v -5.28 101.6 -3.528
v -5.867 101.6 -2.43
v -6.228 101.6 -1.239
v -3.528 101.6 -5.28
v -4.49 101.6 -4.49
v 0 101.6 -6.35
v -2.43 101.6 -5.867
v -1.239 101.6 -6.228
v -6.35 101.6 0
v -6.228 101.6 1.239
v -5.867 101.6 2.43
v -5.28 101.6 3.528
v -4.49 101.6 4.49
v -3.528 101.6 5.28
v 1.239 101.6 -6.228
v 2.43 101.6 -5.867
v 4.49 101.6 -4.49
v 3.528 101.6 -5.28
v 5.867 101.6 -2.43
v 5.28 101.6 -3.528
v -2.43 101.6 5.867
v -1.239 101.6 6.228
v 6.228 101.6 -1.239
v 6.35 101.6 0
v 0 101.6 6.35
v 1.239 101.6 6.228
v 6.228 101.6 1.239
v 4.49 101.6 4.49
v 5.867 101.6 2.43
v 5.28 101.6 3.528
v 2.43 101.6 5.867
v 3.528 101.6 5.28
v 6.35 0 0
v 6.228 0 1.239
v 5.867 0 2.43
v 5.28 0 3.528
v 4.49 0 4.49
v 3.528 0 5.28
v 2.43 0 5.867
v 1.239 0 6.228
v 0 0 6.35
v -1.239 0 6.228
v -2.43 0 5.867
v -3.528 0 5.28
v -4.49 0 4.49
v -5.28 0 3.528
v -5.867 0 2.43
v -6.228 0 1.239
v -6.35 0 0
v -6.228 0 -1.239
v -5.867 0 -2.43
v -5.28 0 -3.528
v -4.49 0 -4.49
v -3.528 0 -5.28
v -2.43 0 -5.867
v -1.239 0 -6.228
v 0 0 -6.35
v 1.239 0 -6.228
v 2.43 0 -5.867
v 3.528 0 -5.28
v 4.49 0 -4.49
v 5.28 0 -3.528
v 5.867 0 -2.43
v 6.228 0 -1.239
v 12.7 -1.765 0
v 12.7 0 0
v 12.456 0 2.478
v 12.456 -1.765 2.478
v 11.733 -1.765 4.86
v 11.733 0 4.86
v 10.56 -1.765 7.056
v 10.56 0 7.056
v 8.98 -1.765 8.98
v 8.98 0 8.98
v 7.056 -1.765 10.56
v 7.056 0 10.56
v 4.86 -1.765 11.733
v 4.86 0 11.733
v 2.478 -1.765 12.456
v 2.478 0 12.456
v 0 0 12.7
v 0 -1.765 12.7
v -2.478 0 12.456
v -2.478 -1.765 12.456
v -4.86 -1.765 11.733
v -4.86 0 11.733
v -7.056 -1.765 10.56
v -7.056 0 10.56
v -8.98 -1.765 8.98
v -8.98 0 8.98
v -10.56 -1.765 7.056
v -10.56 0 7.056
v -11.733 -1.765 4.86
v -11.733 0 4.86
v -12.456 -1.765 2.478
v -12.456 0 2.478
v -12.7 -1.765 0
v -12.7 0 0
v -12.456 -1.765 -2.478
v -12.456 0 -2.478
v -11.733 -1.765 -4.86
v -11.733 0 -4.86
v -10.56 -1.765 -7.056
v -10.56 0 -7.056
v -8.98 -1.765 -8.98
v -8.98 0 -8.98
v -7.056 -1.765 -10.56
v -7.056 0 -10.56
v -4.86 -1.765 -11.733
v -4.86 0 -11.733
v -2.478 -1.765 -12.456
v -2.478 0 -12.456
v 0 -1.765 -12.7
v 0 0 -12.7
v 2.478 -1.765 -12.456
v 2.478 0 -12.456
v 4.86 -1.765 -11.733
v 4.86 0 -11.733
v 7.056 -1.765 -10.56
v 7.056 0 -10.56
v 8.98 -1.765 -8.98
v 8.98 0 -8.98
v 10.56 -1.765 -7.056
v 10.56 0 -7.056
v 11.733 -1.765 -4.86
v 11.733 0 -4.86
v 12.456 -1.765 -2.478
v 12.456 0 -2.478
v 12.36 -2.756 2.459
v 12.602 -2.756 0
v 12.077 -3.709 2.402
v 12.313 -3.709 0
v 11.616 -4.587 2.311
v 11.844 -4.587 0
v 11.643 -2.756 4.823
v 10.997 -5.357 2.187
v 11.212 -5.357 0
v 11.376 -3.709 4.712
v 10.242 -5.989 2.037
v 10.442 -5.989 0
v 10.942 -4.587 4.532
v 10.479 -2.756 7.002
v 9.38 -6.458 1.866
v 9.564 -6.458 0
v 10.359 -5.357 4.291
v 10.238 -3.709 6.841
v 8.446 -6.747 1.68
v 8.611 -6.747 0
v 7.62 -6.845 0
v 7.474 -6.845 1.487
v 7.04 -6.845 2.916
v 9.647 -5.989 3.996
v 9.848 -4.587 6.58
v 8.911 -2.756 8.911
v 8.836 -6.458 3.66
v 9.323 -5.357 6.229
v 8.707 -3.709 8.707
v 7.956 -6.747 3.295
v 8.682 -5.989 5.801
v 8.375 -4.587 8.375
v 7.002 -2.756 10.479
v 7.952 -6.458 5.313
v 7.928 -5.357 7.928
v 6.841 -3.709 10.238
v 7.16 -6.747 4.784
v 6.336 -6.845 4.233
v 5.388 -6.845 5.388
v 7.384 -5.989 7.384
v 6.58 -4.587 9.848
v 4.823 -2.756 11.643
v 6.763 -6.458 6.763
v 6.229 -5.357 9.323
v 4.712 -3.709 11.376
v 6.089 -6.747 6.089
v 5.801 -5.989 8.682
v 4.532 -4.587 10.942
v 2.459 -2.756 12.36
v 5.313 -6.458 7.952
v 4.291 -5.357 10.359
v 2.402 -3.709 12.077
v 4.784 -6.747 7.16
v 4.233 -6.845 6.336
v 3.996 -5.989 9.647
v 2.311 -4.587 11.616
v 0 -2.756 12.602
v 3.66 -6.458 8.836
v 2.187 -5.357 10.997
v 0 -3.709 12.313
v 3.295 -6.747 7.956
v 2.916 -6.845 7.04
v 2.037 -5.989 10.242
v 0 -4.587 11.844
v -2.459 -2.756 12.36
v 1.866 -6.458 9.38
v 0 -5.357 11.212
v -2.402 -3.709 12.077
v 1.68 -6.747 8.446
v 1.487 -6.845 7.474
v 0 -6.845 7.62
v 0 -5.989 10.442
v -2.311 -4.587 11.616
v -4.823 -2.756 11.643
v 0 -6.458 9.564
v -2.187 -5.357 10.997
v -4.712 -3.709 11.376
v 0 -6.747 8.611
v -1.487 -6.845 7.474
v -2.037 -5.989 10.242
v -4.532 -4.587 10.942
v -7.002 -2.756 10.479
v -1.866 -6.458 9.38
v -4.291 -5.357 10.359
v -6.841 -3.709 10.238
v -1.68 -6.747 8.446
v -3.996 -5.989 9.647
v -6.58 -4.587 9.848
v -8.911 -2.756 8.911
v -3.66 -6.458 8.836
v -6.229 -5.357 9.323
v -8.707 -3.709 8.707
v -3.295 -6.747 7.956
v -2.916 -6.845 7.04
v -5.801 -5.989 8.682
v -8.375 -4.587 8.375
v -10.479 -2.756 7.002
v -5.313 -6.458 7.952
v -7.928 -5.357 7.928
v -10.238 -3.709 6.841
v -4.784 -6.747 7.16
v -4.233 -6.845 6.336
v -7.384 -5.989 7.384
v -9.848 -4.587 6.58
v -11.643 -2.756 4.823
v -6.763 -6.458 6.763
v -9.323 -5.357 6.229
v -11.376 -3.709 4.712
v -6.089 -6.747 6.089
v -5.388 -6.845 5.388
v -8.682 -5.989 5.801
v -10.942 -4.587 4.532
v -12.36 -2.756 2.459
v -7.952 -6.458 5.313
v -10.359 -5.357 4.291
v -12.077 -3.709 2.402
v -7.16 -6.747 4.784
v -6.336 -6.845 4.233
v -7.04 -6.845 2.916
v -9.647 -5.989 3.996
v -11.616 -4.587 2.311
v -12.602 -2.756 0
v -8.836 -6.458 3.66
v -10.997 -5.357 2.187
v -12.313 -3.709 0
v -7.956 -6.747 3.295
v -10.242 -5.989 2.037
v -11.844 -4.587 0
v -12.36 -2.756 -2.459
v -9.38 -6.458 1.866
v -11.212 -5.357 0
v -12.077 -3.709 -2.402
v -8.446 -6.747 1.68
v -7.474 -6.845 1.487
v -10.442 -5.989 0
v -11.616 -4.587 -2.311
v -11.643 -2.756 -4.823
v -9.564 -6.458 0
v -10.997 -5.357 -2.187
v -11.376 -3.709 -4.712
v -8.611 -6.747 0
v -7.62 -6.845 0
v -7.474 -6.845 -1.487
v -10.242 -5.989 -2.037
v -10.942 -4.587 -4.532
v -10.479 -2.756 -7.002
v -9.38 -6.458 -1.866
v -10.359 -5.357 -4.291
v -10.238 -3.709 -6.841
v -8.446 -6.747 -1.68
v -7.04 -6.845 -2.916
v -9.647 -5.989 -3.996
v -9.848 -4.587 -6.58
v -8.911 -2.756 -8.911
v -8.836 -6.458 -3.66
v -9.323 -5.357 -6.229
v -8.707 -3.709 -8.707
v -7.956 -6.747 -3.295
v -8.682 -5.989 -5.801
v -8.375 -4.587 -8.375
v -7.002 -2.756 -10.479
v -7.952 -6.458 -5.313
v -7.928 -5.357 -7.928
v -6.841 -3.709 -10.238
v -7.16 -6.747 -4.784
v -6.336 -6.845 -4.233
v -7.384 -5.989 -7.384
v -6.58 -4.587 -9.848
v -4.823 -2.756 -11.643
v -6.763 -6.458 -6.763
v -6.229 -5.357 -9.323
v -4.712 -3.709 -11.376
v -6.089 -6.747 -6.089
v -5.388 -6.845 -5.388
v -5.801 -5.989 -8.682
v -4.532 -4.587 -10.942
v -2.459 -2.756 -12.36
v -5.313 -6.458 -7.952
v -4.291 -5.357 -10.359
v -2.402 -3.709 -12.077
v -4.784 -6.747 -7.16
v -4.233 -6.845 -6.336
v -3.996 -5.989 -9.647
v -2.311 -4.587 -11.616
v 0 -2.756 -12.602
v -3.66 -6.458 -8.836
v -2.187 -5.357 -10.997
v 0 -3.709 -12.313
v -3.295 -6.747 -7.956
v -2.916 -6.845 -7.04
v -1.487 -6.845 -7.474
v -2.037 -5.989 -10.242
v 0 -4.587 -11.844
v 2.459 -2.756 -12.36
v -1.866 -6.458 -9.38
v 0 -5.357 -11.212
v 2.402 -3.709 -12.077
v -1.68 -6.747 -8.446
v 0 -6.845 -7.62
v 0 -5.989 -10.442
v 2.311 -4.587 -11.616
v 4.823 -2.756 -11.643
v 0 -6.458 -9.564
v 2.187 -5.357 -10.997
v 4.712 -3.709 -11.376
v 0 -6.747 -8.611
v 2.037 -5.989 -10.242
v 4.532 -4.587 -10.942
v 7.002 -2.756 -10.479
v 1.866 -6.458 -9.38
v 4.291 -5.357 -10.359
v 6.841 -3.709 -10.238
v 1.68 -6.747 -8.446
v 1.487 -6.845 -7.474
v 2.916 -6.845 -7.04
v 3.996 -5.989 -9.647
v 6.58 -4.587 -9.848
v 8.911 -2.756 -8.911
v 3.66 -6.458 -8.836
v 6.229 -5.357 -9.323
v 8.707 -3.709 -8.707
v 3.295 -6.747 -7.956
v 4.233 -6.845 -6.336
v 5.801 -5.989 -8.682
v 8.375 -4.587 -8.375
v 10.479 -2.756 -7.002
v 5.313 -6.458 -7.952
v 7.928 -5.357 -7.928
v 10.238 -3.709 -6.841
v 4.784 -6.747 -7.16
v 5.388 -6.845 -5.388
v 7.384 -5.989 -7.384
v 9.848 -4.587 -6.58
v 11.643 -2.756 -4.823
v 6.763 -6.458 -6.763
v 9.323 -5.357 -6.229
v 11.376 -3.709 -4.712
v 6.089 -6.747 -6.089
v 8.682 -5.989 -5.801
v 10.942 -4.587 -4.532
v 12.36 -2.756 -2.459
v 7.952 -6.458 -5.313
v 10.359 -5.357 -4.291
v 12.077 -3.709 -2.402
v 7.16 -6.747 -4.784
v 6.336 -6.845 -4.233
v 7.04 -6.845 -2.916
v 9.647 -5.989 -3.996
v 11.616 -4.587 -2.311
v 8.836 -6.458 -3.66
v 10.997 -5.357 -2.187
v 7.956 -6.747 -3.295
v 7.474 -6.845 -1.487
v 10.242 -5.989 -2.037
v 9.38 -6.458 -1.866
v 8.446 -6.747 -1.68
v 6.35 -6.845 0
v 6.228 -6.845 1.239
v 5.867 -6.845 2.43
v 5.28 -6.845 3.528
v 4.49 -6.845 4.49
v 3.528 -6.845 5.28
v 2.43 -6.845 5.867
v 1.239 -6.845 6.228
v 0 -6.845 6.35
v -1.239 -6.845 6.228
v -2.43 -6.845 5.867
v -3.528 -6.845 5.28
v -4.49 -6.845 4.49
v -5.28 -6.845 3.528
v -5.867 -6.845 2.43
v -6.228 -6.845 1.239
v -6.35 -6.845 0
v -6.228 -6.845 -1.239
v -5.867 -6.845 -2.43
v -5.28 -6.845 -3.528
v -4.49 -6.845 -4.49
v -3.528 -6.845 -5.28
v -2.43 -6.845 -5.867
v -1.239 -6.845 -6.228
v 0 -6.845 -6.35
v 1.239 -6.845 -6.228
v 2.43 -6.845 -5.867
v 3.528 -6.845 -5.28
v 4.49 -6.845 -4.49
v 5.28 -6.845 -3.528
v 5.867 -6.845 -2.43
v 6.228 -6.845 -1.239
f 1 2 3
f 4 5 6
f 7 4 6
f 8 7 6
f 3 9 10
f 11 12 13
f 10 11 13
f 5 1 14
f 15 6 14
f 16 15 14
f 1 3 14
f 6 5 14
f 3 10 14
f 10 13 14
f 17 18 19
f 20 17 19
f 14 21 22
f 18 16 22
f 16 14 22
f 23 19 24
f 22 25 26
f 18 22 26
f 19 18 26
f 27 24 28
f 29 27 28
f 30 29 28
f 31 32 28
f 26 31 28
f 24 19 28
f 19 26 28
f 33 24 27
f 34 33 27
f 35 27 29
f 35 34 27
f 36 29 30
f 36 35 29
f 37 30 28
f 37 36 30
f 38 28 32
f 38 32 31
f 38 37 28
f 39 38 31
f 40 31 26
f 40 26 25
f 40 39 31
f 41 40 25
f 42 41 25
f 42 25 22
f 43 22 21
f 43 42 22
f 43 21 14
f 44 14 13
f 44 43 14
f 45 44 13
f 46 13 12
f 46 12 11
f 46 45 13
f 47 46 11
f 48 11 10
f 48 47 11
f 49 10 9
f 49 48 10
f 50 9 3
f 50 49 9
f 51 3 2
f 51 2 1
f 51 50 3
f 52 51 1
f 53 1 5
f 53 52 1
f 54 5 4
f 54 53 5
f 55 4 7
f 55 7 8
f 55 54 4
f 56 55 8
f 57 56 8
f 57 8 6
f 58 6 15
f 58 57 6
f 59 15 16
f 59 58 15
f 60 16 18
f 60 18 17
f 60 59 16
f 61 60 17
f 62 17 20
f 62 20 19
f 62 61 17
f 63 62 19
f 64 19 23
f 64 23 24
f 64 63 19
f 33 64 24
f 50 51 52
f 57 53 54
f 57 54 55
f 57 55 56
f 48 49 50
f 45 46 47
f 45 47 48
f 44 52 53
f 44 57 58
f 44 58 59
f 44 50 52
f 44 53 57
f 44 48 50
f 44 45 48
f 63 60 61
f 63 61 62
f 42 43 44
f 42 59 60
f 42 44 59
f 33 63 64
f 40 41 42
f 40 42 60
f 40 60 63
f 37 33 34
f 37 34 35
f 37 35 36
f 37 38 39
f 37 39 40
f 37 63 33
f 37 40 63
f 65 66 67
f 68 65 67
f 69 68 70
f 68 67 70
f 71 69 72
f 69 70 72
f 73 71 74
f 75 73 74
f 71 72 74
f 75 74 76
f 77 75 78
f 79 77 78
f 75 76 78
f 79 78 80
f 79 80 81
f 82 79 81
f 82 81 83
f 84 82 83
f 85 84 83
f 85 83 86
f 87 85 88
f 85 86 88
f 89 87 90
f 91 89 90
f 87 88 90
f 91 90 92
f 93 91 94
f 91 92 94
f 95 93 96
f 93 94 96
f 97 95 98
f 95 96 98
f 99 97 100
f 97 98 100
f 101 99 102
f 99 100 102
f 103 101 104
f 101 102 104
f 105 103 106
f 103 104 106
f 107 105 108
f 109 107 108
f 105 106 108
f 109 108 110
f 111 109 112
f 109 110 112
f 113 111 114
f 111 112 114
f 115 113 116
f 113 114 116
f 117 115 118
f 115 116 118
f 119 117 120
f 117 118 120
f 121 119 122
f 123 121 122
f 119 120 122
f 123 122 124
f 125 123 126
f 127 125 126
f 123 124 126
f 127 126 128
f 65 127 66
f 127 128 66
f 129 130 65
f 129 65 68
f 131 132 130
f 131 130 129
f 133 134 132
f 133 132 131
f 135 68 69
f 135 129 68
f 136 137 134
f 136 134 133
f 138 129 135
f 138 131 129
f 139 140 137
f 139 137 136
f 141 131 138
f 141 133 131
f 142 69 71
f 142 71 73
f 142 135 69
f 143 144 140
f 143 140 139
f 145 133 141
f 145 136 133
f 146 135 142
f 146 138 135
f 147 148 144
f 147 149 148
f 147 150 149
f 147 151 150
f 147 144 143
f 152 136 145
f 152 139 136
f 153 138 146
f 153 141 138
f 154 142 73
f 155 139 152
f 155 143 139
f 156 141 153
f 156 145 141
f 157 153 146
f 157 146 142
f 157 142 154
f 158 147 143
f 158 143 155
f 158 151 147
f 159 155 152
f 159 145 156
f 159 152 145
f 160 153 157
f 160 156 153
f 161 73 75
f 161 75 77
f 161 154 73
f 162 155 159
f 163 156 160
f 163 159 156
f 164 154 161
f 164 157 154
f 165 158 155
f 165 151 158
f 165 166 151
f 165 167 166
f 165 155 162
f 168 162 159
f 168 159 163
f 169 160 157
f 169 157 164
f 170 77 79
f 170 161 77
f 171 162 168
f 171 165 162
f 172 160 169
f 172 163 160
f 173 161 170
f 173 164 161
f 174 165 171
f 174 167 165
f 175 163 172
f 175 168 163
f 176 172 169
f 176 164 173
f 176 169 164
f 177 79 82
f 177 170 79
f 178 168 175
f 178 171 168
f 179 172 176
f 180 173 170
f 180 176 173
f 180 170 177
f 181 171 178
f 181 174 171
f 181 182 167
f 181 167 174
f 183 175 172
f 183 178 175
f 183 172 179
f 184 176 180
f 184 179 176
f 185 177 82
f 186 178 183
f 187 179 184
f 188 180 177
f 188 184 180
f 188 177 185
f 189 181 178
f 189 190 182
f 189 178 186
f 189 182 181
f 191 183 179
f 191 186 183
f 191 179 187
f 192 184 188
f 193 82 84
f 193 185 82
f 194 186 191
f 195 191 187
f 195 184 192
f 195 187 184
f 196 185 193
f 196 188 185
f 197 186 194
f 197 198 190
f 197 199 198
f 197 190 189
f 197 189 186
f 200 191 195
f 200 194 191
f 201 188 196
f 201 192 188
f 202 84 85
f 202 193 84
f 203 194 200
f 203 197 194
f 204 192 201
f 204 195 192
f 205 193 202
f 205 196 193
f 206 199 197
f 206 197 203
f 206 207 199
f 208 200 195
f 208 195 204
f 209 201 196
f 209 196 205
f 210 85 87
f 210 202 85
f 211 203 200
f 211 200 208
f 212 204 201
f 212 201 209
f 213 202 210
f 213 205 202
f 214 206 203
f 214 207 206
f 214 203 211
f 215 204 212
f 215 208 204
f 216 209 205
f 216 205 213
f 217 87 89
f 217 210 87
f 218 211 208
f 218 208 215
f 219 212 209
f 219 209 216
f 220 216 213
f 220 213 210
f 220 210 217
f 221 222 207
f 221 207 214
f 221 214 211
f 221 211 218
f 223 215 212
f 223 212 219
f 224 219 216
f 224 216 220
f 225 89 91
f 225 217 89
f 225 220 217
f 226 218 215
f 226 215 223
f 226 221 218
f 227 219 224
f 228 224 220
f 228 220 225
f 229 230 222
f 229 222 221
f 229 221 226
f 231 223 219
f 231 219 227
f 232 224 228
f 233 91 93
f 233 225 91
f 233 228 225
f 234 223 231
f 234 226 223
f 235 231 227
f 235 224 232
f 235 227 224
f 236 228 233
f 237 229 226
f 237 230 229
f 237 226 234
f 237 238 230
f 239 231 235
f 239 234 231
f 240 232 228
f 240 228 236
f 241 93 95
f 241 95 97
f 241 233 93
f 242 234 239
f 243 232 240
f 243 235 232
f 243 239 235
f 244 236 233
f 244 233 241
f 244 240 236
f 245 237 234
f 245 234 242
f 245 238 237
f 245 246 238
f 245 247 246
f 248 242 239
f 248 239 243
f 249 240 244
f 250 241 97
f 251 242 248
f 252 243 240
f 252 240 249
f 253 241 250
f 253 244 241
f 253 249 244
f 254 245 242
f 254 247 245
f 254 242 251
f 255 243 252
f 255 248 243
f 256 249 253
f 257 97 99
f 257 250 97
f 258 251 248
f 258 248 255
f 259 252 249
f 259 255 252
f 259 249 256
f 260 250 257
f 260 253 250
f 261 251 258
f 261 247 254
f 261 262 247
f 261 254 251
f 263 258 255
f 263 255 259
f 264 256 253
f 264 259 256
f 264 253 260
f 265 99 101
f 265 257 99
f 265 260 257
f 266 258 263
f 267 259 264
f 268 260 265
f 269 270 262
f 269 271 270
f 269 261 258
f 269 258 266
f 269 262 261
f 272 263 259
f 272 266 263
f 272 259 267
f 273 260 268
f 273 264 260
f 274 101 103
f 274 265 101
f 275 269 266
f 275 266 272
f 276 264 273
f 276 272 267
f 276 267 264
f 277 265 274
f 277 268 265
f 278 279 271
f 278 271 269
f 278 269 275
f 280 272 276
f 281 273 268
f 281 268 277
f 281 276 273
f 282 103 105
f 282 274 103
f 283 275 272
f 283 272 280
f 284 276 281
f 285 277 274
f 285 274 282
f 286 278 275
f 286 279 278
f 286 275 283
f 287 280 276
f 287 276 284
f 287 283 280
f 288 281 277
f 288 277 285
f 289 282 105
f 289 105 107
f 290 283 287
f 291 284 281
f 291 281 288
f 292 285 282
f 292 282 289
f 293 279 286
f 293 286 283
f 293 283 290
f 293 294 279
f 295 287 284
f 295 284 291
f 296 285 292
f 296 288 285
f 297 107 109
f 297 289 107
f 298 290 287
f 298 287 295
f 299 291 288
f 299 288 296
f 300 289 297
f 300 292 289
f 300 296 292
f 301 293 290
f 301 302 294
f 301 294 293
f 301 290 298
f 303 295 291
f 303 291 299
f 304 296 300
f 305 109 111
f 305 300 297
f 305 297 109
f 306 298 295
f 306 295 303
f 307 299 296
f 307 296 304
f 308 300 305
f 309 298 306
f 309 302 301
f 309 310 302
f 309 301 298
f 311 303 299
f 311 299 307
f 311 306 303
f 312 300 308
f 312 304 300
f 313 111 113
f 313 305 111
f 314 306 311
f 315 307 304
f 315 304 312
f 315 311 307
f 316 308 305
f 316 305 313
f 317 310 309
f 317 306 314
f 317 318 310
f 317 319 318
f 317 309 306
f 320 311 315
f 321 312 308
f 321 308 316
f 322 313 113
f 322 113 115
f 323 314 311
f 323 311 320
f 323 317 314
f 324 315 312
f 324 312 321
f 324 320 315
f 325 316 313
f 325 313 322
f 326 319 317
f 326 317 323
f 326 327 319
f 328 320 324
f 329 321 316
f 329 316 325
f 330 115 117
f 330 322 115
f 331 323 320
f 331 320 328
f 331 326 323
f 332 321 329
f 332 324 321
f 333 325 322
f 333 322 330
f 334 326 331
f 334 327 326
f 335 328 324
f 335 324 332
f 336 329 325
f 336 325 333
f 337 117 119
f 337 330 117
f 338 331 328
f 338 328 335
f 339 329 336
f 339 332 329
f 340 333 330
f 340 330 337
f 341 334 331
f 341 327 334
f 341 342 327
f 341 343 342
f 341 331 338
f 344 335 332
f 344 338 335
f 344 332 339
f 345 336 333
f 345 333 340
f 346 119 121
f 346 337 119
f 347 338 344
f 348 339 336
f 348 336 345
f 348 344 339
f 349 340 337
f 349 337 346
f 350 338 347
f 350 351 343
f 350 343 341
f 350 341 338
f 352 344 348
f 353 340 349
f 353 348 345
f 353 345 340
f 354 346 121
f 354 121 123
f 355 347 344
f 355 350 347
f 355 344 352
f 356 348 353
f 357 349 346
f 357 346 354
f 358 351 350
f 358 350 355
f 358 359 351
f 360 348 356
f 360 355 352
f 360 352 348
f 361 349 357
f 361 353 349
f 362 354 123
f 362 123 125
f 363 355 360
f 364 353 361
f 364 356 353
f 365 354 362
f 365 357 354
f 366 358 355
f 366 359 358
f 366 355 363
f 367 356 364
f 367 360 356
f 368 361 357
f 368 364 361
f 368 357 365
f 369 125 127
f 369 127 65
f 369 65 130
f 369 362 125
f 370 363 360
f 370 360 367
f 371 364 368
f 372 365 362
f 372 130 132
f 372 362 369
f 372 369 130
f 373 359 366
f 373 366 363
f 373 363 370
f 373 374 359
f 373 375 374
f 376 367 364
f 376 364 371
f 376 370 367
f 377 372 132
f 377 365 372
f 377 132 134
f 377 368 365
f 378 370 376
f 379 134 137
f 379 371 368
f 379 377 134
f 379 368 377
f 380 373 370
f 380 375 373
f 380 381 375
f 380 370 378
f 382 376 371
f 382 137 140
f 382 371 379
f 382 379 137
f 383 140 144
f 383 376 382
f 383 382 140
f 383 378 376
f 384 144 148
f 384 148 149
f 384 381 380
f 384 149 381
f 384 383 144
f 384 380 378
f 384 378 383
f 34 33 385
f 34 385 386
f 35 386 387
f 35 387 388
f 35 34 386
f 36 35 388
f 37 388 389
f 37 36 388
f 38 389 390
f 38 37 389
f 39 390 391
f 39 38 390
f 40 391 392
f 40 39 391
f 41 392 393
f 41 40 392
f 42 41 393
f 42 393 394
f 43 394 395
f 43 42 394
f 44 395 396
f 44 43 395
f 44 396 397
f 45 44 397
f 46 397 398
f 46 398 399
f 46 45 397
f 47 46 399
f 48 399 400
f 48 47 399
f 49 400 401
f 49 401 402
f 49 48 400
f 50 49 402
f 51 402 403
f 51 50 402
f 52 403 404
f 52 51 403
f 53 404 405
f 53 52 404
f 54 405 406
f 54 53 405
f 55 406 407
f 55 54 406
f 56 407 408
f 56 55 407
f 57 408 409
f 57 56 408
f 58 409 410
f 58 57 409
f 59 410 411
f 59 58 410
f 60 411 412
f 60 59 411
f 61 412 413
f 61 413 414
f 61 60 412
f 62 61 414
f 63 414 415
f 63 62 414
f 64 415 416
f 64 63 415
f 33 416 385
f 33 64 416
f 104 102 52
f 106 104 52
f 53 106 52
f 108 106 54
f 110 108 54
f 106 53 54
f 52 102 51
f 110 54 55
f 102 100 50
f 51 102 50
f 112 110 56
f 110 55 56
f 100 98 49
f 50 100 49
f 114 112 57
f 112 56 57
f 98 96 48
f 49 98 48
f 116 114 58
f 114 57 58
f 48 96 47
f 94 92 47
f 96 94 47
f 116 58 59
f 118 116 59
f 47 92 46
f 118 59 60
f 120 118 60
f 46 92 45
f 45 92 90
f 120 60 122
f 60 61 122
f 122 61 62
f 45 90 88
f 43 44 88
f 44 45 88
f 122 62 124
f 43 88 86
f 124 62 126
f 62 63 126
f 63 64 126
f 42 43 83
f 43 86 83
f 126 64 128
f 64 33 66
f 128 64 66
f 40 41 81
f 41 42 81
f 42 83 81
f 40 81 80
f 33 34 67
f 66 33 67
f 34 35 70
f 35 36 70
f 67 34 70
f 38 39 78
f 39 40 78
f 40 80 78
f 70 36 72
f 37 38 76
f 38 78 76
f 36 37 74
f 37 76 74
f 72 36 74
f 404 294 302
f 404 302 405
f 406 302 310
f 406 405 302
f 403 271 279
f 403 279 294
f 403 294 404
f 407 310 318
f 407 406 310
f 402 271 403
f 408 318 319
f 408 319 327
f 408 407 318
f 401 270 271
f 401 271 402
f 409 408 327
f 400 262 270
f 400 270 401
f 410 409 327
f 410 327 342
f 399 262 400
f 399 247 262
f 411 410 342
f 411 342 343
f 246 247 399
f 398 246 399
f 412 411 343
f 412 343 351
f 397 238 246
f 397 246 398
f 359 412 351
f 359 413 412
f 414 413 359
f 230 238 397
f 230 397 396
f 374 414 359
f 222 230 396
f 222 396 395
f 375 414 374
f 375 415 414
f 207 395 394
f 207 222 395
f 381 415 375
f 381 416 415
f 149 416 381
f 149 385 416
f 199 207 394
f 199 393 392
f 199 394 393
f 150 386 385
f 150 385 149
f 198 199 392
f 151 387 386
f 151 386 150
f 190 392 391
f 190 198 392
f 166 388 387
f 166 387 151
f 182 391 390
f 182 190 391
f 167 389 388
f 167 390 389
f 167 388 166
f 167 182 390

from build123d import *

# Parameters (mm, degrees)
F0_R     = 12.7
F0_R_2   = 6.35
F1_DEPTH = 6.844871
F2_R     = 5.08
F3_DEPTH = 101.6


with BuildPart() as f1:
    # F0 (on Front) → F1 (new body)
    with BuildSketch(Plane.XZ):
        Circle(F0_R)
        Circle(F0_R_2, mode=Mode.SUBTRACT)
    extrude(amount=F1_DEPTH)

    # F2
    f2_edges = [f1.edges().sort_by_distance(p)[0] for p in [
        (-12.7, -6.844871, 0),
    ]]
    fillet(f2_edges, radius=F2_R)


with BuildPart() as f3:
    # F0 (on Front) → F3 (new body)
    with BuildSketch(Plane.XZ):
        Circle(F0_R_2)
    extrude(amount=-F3_DEPTH)


solid = Compound([f1.part, f3.part])
